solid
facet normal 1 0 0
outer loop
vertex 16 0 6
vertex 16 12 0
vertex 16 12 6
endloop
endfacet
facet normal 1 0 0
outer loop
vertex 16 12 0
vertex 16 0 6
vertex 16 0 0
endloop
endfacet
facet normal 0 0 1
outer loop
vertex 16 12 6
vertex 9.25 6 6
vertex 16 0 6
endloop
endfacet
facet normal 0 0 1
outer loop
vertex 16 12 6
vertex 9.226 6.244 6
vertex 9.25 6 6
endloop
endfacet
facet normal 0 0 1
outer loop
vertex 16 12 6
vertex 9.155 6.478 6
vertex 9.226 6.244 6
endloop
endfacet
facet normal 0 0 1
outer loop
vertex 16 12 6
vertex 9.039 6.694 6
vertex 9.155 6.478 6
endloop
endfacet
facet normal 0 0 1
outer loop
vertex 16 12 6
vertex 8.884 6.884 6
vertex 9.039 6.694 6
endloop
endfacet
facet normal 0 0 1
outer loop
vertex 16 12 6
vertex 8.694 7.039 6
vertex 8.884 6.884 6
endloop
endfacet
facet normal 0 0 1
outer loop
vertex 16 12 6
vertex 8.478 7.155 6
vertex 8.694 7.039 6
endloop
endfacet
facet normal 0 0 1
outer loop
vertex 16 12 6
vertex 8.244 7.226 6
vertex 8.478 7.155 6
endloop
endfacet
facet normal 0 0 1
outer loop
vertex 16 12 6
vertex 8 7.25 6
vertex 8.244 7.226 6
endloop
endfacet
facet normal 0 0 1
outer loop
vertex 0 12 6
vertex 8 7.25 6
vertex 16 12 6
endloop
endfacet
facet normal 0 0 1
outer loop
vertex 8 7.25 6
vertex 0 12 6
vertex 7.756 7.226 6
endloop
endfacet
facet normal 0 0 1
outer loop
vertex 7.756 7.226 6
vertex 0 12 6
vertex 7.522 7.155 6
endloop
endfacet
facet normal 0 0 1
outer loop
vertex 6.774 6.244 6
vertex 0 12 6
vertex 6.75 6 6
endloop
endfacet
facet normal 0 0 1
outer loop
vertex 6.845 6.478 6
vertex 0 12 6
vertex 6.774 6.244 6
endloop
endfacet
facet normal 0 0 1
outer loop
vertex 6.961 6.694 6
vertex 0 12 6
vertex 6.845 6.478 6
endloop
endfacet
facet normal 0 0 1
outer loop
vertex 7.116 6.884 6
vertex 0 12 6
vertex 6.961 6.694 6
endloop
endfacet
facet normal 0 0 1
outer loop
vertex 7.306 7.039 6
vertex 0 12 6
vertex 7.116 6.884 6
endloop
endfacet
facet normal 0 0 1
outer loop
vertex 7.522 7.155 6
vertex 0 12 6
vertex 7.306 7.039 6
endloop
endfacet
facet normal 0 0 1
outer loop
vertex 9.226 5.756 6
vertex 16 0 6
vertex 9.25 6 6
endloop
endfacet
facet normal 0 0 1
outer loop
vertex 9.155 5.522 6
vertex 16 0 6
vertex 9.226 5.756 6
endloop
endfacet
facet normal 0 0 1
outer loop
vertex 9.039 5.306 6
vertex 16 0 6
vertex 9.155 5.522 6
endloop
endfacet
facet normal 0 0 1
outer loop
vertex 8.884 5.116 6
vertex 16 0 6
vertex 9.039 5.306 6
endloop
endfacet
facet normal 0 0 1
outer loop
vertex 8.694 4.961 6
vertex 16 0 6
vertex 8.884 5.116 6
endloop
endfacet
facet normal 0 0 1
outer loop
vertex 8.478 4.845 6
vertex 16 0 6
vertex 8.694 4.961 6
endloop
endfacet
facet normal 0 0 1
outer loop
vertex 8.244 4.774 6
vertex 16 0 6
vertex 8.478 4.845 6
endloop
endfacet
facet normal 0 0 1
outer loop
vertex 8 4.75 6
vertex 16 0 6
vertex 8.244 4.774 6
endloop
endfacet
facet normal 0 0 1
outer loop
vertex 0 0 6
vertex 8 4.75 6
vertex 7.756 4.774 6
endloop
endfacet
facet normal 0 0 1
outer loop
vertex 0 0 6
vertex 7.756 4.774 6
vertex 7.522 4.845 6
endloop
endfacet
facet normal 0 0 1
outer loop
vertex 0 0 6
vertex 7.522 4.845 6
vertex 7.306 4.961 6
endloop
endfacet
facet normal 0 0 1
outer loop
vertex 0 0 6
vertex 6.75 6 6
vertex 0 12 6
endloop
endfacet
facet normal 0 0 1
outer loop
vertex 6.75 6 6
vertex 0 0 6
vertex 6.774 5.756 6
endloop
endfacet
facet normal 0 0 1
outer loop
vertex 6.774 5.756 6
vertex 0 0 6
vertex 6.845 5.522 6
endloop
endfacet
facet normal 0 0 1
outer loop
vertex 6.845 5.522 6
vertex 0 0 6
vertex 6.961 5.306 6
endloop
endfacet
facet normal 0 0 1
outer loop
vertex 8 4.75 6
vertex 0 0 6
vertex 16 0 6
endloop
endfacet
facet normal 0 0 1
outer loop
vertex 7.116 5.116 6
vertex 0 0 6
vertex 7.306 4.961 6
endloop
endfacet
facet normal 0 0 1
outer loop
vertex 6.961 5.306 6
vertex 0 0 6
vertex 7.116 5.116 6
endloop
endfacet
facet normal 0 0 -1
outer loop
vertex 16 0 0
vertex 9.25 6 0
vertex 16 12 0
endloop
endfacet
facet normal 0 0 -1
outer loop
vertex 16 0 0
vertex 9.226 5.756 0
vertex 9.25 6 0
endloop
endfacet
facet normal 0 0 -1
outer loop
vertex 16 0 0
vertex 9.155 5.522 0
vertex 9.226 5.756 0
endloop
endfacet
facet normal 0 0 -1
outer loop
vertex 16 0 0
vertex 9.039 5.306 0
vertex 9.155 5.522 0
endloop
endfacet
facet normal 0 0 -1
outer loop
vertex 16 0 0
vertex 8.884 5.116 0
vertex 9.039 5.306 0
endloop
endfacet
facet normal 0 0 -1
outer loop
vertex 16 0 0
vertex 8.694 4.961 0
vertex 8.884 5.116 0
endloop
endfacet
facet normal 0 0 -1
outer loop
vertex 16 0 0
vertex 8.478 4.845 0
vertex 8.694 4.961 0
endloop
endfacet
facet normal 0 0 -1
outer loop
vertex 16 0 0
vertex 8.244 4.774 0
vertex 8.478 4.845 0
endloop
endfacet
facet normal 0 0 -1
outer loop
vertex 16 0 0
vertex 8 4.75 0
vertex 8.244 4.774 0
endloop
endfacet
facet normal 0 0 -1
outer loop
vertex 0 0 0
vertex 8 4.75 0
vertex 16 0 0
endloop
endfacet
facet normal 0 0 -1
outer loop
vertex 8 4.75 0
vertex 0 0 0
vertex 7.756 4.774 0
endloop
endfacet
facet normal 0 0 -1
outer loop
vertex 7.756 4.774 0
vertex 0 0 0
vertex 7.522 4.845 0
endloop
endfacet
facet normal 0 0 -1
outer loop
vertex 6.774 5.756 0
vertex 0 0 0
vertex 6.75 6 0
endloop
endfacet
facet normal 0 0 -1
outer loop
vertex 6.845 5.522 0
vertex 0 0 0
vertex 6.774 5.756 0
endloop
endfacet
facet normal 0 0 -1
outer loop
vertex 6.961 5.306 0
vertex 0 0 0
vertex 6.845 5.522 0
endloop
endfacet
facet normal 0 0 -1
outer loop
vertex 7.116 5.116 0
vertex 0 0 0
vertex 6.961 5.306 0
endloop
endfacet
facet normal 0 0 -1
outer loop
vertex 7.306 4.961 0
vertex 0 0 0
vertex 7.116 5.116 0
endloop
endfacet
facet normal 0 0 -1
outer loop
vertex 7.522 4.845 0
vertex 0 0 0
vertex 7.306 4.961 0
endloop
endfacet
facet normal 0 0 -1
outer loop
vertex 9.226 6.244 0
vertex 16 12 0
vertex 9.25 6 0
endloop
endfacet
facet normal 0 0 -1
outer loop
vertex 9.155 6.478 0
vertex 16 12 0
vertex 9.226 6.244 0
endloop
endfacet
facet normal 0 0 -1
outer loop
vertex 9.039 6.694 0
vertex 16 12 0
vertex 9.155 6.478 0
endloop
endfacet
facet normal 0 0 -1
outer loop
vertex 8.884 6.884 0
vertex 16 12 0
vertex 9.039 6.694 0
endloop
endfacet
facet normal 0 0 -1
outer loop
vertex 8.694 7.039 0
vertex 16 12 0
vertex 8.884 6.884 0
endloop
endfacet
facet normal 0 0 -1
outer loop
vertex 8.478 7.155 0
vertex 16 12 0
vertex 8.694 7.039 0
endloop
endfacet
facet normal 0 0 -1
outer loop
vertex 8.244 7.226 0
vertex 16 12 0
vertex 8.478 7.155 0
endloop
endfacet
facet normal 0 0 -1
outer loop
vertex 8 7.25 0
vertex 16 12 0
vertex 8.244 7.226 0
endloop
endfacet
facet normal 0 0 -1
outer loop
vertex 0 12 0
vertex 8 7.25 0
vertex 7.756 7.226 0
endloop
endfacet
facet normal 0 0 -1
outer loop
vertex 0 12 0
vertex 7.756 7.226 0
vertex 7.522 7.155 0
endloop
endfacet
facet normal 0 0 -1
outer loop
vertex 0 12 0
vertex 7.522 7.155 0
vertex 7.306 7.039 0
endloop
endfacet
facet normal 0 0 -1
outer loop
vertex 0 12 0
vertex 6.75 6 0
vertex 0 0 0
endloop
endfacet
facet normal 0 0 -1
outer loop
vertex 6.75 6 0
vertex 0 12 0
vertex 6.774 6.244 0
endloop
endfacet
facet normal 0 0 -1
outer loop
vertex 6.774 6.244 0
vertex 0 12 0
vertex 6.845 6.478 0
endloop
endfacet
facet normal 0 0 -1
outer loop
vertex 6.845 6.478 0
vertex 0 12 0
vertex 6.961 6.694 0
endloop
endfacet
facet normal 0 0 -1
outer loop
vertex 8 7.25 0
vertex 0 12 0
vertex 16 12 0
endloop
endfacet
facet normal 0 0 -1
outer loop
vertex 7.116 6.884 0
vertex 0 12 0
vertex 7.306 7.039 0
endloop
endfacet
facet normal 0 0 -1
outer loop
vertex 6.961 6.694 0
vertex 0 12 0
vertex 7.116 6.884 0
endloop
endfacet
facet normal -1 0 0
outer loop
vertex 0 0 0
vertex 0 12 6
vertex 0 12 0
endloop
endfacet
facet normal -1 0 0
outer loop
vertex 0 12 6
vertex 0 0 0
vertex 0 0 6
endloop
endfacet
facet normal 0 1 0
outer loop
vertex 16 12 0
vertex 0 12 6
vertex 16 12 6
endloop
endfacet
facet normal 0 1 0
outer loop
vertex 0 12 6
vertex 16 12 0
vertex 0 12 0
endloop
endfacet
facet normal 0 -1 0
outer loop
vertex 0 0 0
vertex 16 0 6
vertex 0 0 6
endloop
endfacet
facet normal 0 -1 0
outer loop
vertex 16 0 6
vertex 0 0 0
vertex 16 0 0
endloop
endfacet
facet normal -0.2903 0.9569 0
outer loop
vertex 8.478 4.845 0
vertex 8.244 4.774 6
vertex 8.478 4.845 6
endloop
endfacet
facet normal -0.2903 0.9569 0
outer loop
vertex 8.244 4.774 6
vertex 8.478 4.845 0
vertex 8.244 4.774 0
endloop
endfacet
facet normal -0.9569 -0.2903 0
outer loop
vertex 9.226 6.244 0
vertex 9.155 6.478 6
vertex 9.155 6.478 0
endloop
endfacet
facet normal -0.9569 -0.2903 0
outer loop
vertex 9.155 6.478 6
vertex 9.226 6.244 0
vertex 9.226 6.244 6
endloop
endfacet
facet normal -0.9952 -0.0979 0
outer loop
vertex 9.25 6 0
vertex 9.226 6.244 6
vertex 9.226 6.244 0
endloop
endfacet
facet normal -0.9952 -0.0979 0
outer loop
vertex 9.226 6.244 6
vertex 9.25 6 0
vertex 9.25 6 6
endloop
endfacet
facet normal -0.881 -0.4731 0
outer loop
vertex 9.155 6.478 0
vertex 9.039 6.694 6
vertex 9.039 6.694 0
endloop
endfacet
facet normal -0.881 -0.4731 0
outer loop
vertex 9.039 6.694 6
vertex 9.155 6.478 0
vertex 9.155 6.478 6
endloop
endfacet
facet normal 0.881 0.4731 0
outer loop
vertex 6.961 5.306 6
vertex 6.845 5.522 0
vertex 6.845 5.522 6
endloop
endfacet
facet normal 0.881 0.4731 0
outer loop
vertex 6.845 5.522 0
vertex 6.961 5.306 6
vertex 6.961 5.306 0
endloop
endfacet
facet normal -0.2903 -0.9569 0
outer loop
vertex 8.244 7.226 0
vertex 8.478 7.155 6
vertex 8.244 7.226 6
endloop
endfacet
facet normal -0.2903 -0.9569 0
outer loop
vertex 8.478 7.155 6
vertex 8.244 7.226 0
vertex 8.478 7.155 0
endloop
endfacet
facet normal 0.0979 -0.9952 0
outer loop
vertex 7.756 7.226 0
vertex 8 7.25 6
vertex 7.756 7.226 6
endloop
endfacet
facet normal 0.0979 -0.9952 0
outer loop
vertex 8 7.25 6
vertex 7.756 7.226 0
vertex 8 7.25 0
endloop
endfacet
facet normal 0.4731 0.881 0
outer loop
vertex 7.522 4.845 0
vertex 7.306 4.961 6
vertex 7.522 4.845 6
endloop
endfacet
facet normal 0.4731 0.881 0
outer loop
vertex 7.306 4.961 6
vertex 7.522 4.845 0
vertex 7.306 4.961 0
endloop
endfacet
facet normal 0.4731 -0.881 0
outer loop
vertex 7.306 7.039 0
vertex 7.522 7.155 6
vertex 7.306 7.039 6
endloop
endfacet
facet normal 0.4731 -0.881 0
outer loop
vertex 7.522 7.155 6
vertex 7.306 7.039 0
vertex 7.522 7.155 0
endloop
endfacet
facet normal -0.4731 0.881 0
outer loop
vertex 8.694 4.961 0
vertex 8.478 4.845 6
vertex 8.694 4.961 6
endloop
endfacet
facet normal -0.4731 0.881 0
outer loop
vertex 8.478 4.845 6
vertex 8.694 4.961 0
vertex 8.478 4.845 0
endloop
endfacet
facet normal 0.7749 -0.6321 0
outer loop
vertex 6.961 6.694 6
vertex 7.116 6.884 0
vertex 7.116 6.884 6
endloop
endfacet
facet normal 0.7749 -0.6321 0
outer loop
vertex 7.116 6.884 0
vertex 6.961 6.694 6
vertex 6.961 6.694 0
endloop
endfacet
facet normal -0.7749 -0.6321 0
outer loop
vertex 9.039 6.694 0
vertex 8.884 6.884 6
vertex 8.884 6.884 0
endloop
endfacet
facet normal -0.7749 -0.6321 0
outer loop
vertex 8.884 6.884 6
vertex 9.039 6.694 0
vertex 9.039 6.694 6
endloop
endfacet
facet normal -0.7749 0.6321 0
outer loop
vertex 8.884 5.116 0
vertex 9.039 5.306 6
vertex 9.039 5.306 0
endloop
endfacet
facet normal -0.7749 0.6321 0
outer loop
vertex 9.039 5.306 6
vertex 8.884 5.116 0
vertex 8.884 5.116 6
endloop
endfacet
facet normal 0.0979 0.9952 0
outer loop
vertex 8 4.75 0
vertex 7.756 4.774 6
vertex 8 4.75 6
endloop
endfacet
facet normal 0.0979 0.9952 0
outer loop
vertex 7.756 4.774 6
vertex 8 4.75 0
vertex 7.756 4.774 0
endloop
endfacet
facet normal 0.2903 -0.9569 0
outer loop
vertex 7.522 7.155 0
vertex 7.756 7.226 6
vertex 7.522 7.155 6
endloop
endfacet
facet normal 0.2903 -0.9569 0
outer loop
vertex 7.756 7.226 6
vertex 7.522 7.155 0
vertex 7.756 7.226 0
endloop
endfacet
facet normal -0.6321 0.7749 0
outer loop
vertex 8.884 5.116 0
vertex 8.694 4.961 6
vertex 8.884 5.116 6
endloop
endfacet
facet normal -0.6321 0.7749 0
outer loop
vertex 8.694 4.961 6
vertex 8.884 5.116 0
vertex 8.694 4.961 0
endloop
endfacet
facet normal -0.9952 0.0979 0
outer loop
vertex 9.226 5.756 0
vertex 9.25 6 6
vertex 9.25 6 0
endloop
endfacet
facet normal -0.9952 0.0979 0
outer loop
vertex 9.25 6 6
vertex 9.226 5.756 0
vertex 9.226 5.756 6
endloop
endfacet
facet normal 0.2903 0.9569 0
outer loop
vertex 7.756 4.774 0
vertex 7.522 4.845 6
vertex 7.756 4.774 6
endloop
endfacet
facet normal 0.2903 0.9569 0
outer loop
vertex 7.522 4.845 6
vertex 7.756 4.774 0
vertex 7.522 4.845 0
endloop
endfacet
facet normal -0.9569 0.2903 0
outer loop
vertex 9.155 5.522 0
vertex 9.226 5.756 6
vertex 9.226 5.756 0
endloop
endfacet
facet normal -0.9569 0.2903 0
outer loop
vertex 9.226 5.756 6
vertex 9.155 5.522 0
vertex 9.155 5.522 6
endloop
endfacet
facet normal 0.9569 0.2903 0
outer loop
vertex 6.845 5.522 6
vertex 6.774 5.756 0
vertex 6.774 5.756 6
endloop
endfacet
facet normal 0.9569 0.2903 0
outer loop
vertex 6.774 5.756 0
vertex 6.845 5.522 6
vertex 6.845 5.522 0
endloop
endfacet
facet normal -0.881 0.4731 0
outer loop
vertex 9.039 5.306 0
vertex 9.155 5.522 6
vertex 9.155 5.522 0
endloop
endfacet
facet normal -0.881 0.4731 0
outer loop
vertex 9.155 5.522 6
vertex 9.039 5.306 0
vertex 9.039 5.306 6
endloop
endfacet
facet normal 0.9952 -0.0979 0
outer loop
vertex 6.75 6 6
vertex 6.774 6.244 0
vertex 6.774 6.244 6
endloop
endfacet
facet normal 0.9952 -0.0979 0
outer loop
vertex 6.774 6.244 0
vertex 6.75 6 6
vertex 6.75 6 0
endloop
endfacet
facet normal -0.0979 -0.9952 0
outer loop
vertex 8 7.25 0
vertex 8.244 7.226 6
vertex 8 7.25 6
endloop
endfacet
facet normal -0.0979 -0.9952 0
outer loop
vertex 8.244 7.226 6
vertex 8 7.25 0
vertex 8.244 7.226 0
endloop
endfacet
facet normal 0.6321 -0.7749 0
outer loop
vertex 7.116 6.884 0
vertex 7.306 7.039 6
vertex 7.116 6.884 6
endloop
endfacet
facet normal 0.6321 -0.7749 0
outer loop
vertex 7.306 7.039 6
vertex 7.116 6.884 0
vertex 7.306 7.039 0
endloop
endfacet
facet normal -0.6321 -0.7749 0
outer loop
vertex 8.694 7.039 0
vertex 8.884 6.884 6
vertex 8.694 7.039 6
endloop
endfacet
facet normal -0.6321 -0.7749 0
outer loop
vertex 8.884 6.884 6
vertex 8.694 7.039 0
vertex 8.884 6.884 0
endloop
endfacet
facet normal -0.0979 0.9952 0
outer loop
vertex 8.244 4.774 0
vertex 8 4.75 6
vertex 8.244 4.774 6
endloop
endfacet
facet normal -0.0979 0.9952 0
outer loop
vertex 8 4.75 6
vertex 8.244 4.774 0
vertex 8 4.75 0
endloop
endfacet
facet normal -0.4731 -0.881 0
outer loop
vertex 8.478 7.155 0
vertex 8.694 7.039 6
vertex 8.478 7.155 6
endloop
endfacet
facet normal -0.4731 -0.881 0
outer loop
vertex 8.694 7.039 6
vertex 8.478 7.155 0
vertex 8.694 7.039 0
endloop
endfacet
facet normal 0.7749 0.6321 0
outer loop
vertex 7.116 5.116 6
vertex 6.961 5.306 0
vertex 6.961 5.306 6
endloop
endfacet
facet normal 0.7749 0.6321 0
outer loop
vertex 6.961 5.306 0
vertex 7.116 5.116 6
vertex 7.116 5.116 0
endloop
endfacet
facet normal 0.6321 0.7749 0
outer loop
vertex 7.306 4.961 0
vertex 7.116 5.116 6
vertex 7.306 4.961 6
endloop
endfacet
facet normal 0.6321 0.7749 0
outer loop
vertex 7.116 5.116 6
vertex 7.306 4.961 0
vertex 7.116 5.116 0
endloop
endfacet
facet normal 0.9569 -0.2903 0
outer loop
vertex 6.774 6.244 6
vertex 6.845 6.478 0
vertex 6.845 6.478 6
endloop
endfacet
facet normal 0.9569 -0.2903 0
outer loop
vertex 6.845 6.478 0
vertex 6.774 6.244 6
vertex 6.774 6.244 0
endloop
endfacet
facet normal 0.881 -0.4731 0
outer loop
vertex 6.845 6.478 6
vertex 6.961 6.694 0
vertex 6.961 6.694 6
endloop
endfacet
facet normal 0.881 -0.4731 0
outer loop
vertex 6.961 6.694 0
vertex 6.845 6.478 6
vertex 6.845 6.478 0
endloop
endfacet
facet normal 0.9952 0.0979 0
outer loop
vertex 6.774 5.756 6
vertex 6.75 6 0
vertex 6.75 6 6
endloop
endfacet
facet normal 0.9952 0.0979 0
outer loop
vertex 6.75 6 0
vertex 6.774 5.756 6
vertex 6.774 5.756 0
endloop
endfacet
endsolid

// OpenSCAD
$fn = 32;

// ----------------------------------------------------------------------
// Micro pad: drilled pad, 5-20 mm class
// ----------------------------------------------------------------------

// --- parameters (mm) ---
pad_l = 16;               // pad length, X
pad_w = 12;               // pad width, Y
pad_t = 6;                // pad thickness, Z
hole_d = 2.5;             // through hole diameter

difference() {
  cube([pad_l, pad_w, pad_t]);
  translate([pad_l / 2, pad_w / 2, -1])
    cylinder(h = pad_t + 2, d = hole_d);
}
